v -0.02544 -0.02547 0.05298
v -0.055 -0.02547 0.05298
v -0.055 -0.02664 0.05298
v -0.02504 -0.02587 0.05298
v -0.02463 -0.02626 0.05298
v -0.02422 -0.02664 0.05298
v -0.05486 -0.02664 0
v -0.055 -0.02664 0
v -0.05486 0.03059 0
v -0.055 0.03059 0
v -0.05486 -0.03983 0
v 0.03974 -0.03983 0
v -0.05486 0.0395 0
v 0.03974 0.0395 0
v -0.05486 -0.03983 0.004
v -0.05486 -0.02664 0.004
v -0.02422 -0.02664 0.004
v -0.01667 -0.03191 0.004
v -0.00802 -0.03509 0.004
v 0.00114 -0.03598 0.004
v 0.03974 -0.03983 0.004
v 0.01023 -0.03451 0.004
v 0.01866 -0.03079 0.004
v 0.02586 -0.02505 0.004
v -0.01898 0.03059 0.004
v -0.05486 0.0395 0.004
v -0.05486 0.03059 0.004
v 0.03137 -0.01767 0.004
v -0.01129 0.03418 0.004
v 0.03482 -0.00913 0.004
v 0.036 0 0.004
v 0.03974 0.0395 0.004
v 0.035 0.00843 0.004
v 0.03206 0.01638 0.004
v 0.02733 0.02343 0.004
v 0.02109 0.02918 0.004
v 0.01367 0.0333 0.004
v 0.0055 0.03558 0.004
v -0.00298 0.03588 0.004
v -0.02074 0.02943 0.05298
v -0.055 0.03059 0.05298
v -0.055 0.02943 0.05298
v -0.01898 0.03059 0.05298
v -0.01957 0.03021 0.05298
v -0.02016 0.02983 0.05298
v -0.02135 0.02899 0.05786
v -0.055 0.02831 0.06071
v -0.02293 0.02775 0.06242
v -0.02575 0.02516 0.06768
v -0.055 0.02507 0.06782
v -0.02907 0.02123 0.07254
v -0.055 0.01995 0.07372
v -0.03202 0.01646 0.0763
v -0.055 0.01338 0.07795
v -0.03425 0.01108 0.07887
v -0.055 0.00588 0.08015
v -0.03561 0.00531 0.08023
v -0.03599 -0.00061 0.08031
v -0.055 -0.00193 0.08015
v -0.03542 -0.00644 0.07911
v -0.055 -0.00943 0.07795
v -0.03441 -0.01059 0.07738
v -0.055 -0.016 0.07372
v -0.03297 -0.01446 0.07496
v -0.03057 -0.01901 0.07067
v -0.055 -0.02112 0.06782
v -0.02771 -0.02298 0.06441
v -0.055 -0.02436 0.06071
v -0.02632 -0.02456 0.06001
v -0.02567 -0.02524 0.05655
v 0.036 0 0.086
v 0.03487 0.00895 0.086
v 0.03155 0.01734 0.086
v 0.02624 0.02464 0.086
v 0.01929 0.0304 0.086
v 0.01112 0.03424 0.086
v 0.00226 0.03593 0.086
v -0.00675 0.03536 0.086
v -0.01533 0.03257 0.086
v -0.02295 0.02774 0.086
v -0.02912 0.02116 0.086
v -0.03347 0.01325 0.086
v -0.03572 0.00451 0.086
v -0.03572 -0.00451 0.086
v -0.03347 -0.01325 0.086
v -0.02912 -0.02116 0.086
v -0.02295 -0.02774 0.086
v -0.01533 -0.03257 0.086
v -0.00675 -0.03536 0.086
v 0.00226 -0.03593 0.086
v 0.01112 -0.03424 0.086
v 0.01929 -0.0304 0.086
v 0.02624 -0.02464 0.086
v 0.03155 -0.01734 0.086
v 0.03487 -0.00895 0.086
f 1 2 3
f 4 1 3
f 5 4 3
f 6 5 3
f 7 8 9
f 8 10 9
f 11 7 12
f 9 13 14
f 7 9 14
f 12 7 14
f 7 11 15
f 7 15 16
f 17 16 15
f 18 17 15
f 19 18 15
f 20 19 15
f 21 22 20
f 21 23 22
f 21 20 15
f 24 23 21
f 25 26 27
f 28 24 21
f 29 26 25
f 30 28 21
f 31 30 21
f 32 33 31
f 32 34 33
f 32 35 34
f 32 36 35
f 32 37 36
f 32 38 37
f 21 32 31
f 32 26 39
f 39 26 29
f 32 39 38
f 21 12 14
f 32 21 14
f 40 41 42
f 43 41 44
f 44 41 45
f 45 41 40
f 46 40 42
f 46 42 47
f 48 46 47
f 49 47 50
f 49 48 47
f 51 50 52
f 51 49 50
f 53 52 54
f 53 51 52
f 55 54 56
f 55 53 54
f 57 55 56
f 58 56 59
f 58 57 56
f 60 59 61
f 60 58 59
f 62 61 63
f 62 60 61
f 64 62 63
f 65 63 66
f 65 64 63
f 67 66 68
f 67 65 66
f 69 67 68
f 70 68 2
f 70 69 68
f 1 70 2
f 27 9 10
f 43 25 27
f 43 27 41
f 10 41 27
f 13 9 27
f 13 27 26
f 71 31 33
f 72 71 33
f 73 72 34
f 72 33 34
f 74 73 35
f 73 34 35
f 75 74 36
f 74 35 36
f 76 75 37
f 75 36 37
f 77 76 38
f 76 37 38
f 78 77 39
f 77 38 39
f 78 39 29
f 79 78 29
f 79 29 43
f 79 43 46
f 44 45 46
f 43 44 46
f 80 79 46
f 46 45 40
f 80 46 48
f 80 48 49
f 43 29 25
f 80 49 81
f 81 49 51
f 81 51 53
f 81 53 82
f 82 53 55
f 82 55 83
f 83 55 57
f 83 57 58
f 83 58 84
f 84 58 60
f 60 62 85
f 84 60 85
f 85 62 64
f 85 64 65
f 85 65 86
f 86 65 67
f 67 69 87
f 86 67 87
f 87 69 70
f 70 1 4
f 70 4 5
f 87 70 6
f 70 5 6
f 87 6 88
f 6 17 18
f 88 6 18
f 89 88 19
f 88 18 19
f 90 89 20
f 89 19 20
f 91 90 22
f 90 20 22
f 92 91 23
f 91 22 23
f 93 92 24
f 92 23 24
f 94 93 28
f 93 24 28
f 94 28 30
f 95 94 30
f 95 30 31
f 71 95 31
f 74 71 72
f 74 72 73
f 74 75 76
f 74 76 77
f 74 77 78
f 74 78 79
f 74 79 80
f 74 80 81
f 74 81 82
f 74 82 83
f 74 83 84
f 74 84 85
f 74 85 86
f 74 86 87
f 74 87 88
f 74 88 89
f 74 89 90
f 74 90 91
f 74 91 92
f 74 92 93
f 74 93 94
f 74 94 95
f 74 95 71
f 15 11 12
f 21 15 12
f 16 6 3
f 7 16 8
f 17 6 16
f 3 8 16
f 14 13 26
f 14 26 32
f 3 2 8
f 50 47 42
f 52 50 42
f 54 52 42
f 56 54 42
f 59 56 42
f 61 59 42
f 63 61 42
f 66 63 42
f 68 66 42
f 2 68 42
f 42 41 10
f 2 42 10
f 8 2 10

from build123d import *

# Parameters (mm, degrees)
SKETCH1_W           = 0.094600407
SKETCH1_H           = 0.079328796
SKETCH1_R           = 0.036000001
BOSS_EXTRUDE1_DEPTH = 0.004
SKETCH1_2_R         = 0.036000001
BOSS_EXTRUDE2_DEPTH = 0.086
BOSS_EXTRUDE3_DEPTH = 0.055


with BuildPart() as part:
    # Sketch1 → Boss-Extrude1 (new body)
    with BuildSketch(Plane.XY):
        with Locations((-0.00756472, -0.000164396)):
            Rectangle(SKETCH1_W, SKETCH1_H)
        Circle(SKETCH1_R, mode=Mode.SUBTRACT)
    extrude(amount=BOSS_EXTRUDE1_DEPTH)

    # Sketch1<2> → Boss-Extrude2 (add)
    with BuildSketch(Plane.XY):
        Circle(SKETCH1_2_R)
    extrude(amount=BOSS_EXTRUDE2_DEPTH)

    # Sketch2 → Boss-Extrude3 (add)
    with BuildSketch(Plane(origin=(0, 0, 0), x_dir=(0, 0, -1), z_dir=(1, 0, 0))):
        with BuildLine():
            Line((-0.052977393, -0.025474995), (-0.052977393, -0.026637747))
            Line((-0.052977393, -0.026637747), (0, -0.026637747))
            Line((0, -0.026637747), (0, 0.030589564))
            Line((0, 0.030589564), (-0.052977393, 0.030589564))
            Line((-0.052977393, 0.030589564), (-0.052977393, 0.029426813))
            ThreePointArc((-0.052977393, 0.029426813), (-0.080428298, 0.001975909), (-0.052977393, -0.025474995))
        make_face()
    extrude(amount=-BOSS_EXTRUDE3_DEPTH)


solid = part.part
